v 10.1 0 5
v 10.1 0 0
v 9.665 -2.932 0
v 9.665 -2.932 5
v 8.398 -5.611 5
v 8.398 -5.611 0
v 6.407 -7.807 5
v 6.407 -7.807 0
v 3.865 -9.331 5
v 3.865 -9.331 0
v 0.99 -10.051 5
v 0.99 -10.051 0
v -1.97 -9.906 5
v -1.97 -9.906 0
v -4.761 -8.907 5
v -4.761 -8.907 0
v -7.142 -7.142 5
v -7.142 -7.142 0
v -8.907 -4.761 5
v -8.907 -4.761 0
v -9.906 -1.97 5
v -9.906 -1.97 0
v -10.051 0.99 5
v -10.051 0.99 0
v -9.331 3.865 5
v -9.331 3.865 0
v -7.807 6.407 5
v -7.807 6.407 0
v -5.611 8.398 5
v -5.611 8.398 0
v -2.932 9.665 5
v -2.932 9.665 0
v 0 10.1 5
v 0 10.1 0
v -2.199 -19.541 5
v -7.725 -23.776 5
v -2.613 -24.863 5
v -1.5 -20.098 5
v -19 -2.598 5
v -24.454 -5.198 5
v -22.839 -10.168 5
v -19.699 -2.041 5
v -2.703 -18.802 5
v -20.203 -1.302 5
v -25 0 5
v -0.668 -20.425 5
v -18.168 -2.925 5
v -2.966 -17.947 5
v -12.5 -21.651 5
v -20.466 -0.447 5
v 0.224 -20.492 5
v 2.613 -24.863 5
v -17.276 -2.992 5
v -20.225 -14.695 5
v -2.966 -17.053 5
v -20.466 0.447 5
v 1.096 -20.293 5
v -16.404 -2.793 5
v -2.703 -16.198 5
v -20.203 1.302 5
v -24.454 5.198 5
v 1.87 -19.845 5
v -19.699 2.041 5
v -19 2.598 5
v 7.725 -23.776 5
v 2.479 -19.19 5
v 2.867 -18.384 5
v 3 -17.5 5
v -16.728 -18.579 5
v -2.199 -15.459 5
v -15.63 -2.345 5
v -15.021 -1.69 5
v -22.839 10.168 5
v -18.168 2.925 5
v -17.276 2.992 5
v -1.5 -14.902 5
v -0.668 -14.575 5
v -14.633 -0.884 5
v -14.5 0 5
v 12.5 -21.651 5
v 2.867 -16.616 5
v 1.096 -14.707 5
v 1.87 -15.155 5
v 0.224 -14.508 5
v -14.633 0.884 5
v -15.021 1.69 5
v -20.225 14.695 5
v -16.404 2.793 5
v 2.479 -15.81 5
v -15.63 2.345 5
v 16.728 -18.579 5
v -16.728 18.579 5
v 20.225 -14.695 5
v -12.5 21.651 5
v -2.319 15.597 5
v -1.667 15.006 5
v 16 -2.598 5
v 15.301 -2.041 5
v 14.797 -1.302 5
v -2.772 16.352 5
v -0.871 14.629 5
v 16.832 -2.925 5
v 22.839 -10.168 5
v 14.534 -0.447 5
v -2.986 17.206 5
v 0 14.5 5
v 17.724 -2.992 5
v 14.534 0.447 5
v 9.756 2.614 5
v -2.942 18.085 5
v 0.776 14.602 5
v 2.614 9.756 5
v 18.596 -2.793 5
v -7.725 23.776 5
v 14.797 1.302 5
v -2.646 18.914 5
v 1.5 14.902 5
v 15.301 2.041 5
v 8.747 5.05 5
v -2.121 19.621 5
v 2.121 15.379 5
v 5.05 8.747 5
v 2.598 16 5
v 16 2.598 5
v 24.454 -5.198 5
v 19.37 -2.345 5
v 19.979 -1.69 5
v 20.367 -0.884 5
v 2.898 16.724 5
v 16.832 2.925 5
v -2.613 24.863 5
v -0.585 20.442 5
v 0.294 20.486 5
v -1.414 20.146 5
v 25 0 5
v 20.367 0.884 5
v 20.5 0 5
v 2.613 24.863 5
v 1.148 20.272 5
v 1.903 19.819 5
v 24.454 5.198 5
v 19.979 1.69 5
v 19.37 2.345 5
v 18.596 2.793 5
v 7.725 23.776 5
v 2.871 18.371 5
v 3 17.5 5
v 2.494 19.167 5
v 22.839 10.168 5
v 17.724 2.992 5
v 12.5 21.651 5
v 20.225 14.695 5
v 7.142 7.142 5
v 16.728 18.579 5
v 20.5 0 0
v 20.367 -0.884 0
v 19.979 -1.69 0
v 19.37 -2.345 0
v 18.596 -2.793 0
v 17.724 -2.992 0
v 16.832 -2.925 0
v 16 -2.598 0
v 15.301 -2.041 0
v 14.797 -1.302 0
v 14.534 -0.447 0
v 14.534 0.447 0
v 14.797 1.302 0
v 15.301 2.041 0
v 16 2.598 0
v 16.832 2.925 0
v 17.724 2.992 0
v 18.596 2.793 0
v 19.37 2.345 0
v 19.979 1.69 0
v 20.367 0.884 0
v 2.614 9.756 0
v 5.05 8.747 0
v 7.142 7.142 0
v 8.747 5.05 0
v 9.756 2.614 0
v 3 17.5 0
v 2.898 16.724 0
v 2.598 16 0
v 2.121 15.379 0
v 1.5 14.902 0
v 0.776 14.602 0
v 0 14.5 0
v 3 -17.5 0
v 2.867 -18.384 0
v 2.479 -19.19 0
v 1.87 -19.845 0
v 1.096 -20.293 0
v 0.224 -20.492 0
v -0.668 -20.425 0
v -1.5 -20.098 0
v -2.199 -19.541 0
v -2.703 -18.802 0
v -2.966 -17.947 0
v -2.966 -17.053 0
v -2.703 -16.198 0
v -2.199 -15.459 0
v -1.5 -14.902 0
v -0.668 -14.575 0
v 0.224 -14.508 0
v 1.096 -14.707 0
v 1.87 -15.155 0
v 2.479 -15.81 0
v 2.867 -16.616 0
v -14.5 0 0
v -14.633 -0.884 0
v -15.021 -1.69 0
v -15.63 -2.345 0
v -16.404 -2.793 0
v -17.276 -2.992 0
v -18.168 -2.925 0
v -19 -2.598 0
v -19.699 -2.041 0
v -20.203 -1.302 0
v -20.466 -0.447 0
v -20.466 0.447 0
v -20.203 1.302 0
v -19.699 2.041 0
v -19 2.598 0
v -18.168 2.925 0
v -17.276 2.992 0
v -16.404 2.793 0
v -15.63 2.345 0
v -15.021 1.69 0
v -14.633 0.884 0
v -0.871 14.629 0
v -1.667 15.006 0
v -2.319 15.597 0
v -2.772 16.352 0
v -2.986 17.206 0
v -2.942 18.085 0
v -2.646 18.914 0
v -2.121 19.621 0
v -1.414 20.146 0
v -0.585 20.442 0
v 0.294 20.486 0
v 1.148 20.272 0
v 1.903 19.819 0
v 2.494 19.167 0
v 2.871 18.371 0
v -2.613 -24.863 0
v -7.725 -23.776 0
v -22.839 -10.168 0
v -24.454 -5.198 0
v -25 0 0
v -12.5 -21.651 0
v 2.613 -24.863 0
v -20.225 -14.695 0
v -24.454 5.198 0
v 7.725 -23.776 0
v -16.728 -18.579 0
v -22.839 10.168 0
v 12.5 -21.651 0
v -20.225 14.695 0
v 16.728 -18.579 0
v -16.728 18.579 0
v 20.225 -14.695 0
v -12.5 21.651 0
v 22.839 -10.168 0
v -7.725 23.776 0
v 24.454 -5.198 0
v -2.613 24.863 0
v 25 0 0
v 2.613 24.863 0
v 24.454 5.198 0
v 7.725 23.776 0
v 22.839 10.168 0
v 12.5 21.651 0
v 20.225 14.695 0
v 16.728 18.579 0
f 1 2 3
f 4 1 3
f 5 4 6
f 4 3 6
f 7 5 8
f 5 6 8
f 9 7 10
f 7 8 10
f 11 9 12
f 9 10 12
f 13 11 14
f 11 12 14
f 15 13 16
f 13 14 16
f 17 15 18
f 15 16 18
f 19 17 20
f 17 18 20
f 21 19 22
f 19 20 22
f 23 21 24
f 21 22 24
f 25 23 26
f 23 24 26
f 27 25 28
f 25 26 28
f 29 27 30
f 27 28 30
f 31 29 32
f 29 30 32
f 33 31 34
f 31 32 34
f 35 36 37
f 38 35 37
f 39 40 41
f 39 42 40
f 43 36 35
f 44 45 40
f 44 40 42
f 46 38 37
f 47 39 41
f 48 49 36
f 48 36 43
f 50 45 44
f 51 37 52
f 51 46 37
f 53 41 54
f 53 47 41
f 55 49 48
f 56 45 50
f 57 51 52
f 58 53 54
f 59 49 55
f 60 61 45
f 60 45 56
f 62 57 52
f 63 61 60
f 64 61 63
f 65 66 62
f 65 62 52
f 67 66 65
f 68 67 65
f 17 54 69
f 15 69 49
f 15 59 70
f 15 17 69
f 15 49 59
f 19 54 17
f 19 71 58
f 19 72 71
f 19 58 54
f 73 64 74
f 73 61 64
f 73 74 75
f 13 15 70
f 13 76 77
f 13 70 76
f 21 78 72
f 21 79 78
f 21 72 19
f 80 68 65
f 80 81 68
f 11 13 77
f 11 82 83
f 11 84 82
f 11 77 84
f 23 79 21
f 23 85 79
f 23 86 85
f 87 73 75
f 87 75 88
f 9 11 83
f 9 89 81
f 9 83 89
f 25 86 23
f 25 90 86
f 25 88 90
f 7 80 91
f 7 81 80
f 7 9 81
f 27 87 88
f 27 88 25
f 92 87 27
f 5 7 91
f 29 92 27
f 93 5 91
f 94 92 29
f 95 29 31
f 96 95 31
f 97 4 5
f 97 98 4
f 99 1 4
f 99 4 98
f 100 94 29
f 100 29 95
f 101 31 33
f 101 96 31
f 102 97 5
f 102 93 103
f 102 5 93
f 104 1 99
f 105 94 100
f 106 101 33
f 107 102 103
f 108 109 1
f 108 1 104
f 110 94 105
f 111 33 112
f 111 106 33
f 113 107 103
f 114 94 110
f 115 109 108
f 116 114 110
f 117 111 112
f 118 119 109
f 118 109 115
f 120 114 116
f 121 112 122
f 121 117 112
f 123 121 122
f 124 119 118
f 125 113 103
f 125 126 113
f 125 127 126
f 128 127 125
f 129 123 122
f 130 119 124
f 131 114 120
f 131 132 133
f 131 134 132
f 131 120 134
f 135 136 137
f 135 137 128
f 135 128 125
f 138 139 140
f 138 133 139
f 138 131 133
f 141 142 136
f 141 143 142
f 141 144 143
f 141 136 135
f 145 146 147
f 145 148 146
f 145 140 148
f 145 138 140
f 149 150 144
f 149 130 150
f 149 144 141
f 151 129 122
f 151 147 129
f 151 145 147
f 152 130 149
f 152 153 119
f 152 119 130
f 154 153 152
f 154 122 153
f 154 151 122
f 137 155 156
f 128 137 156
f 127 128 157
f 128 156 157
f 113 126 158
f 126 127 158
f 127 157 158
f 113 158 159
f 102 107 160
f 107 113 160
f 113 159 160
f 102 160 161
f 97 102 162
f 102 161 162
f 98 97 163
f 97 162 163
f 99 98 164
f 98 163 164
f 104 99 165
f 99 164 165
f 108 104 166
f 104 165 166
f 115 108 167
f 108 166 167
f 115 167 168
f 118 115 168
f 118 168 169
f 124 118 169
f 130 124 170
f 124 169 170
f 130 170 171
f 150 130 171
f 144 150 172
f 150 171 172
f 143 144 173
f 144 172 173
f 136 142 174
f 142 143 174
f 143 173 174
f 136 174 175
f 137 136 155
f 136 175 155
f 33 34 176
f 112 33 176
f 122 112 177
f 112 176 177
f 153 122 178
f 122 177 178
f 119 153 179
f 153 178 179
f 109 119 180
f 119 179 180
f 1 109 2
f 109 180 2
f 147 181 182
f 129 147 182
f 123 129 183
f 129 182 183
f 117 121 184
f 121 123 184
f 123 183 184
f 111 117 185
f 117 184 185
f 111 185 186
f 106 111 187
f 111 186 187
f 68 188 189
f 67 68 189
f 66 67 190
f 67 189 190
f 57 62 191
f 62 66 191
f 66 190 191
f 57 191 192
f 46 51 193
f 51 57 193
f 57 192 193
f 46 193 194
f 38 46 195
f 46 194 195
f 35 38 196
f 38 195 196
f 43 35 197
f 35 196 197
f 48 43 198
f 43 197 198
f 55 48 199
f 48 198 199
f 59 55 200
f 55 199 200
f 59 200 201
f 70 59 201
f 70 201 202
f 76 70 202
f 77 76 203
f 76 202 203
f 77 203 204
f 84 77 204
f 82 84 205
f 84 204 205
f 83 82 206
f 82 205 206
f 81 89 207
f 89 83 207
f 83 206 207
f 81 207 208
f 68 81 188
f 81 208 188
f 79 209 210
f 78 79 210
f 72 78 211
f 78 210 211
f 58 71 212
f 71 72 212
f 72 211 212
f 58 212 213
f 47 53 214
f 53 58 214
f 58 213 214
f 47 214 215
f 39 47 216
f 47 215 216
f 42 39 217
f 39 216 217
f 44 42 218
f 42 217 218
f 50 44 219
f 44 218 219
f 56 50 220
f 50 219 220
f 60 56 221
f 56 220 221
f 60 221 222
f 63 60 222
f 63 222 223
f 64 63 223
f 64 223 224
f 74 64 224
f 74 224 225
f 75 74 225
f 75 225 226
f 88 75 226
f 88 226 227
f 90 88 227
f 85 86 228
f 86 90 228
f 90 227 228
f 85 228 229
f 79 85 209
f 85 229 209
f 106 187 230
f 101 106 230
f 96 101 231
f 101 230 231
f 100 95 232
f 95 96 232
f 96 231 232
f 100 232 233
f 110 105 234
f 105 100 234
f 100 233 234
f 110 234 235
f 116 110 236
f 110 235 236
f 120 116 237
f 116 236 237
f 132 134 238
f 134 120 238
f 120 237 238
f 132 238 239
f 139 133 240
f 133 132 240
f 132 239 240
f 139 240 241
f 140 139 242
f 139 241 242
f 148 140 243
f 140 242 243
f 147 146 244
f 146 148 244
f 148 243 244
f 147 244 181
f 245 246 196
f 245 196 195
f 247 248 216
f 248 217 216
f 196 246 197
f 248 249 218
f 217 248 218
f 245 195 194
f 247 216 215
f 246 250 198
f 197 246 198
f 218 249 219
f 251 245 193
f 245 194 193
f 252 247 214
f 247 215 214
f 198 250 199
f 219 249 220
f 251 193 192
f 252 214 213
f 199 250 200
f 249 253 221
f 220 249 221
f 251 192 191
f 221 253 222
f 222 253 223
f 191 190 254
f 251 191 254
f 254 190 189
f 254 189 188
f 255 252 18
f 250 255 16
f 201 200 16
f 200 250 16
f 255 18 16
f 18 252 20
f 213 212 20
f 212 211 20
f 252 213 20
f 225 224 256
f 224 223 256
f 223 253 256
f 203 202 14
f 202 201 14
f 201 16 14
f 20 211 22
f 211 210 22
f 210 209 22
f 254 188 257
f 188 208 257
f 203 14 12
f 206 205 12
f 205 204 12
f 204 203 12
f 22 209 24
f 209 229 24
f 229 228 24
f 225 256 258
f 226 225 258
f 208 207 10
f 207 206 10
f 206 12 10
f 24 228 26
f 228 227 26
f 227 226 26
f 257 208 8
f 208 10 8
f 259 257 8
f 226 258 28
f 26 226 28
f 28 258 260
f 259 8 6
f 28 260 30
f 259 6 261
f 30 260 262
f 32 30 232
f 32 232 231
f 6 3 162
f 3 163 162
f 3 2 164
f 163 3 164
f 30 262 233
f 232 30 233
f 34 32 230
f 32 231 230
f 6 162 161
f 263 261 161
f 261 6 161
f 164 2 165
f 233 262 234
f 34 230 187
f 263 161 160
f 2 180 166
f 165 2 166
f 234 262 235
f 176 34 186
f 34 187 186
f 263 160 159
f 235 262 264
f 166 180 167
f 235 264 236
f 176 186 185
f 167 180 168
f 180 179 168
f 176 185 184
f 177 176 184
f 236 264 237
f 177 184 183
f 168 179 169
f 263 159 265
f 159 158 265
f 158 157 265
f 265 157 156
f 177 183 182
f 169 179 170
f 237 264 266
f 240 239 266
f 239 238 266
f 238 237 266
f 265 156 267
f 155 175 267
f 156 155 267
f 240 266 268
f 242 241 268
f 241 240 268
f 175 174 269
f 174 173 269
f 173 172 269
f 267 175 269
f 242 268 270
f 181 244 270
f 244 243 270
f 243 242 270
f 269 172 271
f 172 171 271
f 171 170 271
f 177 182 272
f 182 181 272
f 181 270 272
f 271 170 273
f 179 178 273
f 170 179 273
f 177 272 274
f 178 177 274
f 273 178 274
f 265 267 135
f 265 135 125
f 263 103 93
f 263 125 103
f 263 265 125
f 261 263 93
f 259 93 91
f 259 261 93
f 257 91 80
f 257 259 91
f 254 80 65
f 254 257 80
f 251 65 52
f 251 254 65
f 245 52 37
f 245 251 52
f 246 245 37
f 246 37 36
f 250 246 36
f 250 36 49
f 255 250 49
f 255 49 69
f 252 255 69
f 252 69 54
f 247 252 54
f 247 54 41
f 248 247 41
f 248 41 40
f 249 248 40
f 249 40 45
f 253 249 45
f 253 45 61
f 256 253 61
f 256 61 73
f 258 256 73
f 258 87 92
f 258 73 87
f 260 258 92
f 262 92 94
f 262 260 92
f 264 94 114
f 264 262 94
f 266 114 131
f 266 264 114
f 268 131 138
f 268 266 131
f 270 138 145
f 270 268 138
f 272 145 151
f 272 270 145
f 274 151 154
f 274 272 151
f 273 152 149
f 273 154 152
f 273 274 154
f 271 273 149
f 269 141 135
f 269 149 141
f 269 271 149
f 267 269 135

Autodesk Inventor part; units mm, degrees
ref_plane "YZ Plane" through (0, 0, 0) normal (1, 0, 0) x (0, 1, 0)
ref_plane "XZ Plane" through (0, 0, 0) normal (0, 1, 0) x (-1, 0, 0)
ref_plane "XY Plane" through (0, 0, 0) normal (0, 0, 1) x (1, 0, 0)
sketch "Sketch1" plane through (0, 0, 0) normal (0, 0, 1) x (1, 0, 0)
  circle A0 centre (0, 0) radius 10.1
  circle A1 centre (0, 0) radius 25
  circle A2 centre (0, 0) radius 17.5 construction
  circle A3 centre (0, 17.5) radius 3
  circle A4 centre (-17.5, 0) radius 3
  circle A5 centre (0, -17.5) radius 3
  circle A6 centre (17.5, 0) radius 3
  line L0 (0, 0) -> (0, 17.5)
  line L1 (0, 0) -> (17.5, 0) construction
  dimension "d0" = 20.2
  dimension "d1" = 50
  dimension "d2" = 35
  dimension "d3" = 6
  dimension "d6" = 360
  dimension "d8" = 90
extrude "Extrusion1" add sketch "Sketch1" along normal blind 5
properties part number "JTW20" material "Brass, Soft Yellow"
